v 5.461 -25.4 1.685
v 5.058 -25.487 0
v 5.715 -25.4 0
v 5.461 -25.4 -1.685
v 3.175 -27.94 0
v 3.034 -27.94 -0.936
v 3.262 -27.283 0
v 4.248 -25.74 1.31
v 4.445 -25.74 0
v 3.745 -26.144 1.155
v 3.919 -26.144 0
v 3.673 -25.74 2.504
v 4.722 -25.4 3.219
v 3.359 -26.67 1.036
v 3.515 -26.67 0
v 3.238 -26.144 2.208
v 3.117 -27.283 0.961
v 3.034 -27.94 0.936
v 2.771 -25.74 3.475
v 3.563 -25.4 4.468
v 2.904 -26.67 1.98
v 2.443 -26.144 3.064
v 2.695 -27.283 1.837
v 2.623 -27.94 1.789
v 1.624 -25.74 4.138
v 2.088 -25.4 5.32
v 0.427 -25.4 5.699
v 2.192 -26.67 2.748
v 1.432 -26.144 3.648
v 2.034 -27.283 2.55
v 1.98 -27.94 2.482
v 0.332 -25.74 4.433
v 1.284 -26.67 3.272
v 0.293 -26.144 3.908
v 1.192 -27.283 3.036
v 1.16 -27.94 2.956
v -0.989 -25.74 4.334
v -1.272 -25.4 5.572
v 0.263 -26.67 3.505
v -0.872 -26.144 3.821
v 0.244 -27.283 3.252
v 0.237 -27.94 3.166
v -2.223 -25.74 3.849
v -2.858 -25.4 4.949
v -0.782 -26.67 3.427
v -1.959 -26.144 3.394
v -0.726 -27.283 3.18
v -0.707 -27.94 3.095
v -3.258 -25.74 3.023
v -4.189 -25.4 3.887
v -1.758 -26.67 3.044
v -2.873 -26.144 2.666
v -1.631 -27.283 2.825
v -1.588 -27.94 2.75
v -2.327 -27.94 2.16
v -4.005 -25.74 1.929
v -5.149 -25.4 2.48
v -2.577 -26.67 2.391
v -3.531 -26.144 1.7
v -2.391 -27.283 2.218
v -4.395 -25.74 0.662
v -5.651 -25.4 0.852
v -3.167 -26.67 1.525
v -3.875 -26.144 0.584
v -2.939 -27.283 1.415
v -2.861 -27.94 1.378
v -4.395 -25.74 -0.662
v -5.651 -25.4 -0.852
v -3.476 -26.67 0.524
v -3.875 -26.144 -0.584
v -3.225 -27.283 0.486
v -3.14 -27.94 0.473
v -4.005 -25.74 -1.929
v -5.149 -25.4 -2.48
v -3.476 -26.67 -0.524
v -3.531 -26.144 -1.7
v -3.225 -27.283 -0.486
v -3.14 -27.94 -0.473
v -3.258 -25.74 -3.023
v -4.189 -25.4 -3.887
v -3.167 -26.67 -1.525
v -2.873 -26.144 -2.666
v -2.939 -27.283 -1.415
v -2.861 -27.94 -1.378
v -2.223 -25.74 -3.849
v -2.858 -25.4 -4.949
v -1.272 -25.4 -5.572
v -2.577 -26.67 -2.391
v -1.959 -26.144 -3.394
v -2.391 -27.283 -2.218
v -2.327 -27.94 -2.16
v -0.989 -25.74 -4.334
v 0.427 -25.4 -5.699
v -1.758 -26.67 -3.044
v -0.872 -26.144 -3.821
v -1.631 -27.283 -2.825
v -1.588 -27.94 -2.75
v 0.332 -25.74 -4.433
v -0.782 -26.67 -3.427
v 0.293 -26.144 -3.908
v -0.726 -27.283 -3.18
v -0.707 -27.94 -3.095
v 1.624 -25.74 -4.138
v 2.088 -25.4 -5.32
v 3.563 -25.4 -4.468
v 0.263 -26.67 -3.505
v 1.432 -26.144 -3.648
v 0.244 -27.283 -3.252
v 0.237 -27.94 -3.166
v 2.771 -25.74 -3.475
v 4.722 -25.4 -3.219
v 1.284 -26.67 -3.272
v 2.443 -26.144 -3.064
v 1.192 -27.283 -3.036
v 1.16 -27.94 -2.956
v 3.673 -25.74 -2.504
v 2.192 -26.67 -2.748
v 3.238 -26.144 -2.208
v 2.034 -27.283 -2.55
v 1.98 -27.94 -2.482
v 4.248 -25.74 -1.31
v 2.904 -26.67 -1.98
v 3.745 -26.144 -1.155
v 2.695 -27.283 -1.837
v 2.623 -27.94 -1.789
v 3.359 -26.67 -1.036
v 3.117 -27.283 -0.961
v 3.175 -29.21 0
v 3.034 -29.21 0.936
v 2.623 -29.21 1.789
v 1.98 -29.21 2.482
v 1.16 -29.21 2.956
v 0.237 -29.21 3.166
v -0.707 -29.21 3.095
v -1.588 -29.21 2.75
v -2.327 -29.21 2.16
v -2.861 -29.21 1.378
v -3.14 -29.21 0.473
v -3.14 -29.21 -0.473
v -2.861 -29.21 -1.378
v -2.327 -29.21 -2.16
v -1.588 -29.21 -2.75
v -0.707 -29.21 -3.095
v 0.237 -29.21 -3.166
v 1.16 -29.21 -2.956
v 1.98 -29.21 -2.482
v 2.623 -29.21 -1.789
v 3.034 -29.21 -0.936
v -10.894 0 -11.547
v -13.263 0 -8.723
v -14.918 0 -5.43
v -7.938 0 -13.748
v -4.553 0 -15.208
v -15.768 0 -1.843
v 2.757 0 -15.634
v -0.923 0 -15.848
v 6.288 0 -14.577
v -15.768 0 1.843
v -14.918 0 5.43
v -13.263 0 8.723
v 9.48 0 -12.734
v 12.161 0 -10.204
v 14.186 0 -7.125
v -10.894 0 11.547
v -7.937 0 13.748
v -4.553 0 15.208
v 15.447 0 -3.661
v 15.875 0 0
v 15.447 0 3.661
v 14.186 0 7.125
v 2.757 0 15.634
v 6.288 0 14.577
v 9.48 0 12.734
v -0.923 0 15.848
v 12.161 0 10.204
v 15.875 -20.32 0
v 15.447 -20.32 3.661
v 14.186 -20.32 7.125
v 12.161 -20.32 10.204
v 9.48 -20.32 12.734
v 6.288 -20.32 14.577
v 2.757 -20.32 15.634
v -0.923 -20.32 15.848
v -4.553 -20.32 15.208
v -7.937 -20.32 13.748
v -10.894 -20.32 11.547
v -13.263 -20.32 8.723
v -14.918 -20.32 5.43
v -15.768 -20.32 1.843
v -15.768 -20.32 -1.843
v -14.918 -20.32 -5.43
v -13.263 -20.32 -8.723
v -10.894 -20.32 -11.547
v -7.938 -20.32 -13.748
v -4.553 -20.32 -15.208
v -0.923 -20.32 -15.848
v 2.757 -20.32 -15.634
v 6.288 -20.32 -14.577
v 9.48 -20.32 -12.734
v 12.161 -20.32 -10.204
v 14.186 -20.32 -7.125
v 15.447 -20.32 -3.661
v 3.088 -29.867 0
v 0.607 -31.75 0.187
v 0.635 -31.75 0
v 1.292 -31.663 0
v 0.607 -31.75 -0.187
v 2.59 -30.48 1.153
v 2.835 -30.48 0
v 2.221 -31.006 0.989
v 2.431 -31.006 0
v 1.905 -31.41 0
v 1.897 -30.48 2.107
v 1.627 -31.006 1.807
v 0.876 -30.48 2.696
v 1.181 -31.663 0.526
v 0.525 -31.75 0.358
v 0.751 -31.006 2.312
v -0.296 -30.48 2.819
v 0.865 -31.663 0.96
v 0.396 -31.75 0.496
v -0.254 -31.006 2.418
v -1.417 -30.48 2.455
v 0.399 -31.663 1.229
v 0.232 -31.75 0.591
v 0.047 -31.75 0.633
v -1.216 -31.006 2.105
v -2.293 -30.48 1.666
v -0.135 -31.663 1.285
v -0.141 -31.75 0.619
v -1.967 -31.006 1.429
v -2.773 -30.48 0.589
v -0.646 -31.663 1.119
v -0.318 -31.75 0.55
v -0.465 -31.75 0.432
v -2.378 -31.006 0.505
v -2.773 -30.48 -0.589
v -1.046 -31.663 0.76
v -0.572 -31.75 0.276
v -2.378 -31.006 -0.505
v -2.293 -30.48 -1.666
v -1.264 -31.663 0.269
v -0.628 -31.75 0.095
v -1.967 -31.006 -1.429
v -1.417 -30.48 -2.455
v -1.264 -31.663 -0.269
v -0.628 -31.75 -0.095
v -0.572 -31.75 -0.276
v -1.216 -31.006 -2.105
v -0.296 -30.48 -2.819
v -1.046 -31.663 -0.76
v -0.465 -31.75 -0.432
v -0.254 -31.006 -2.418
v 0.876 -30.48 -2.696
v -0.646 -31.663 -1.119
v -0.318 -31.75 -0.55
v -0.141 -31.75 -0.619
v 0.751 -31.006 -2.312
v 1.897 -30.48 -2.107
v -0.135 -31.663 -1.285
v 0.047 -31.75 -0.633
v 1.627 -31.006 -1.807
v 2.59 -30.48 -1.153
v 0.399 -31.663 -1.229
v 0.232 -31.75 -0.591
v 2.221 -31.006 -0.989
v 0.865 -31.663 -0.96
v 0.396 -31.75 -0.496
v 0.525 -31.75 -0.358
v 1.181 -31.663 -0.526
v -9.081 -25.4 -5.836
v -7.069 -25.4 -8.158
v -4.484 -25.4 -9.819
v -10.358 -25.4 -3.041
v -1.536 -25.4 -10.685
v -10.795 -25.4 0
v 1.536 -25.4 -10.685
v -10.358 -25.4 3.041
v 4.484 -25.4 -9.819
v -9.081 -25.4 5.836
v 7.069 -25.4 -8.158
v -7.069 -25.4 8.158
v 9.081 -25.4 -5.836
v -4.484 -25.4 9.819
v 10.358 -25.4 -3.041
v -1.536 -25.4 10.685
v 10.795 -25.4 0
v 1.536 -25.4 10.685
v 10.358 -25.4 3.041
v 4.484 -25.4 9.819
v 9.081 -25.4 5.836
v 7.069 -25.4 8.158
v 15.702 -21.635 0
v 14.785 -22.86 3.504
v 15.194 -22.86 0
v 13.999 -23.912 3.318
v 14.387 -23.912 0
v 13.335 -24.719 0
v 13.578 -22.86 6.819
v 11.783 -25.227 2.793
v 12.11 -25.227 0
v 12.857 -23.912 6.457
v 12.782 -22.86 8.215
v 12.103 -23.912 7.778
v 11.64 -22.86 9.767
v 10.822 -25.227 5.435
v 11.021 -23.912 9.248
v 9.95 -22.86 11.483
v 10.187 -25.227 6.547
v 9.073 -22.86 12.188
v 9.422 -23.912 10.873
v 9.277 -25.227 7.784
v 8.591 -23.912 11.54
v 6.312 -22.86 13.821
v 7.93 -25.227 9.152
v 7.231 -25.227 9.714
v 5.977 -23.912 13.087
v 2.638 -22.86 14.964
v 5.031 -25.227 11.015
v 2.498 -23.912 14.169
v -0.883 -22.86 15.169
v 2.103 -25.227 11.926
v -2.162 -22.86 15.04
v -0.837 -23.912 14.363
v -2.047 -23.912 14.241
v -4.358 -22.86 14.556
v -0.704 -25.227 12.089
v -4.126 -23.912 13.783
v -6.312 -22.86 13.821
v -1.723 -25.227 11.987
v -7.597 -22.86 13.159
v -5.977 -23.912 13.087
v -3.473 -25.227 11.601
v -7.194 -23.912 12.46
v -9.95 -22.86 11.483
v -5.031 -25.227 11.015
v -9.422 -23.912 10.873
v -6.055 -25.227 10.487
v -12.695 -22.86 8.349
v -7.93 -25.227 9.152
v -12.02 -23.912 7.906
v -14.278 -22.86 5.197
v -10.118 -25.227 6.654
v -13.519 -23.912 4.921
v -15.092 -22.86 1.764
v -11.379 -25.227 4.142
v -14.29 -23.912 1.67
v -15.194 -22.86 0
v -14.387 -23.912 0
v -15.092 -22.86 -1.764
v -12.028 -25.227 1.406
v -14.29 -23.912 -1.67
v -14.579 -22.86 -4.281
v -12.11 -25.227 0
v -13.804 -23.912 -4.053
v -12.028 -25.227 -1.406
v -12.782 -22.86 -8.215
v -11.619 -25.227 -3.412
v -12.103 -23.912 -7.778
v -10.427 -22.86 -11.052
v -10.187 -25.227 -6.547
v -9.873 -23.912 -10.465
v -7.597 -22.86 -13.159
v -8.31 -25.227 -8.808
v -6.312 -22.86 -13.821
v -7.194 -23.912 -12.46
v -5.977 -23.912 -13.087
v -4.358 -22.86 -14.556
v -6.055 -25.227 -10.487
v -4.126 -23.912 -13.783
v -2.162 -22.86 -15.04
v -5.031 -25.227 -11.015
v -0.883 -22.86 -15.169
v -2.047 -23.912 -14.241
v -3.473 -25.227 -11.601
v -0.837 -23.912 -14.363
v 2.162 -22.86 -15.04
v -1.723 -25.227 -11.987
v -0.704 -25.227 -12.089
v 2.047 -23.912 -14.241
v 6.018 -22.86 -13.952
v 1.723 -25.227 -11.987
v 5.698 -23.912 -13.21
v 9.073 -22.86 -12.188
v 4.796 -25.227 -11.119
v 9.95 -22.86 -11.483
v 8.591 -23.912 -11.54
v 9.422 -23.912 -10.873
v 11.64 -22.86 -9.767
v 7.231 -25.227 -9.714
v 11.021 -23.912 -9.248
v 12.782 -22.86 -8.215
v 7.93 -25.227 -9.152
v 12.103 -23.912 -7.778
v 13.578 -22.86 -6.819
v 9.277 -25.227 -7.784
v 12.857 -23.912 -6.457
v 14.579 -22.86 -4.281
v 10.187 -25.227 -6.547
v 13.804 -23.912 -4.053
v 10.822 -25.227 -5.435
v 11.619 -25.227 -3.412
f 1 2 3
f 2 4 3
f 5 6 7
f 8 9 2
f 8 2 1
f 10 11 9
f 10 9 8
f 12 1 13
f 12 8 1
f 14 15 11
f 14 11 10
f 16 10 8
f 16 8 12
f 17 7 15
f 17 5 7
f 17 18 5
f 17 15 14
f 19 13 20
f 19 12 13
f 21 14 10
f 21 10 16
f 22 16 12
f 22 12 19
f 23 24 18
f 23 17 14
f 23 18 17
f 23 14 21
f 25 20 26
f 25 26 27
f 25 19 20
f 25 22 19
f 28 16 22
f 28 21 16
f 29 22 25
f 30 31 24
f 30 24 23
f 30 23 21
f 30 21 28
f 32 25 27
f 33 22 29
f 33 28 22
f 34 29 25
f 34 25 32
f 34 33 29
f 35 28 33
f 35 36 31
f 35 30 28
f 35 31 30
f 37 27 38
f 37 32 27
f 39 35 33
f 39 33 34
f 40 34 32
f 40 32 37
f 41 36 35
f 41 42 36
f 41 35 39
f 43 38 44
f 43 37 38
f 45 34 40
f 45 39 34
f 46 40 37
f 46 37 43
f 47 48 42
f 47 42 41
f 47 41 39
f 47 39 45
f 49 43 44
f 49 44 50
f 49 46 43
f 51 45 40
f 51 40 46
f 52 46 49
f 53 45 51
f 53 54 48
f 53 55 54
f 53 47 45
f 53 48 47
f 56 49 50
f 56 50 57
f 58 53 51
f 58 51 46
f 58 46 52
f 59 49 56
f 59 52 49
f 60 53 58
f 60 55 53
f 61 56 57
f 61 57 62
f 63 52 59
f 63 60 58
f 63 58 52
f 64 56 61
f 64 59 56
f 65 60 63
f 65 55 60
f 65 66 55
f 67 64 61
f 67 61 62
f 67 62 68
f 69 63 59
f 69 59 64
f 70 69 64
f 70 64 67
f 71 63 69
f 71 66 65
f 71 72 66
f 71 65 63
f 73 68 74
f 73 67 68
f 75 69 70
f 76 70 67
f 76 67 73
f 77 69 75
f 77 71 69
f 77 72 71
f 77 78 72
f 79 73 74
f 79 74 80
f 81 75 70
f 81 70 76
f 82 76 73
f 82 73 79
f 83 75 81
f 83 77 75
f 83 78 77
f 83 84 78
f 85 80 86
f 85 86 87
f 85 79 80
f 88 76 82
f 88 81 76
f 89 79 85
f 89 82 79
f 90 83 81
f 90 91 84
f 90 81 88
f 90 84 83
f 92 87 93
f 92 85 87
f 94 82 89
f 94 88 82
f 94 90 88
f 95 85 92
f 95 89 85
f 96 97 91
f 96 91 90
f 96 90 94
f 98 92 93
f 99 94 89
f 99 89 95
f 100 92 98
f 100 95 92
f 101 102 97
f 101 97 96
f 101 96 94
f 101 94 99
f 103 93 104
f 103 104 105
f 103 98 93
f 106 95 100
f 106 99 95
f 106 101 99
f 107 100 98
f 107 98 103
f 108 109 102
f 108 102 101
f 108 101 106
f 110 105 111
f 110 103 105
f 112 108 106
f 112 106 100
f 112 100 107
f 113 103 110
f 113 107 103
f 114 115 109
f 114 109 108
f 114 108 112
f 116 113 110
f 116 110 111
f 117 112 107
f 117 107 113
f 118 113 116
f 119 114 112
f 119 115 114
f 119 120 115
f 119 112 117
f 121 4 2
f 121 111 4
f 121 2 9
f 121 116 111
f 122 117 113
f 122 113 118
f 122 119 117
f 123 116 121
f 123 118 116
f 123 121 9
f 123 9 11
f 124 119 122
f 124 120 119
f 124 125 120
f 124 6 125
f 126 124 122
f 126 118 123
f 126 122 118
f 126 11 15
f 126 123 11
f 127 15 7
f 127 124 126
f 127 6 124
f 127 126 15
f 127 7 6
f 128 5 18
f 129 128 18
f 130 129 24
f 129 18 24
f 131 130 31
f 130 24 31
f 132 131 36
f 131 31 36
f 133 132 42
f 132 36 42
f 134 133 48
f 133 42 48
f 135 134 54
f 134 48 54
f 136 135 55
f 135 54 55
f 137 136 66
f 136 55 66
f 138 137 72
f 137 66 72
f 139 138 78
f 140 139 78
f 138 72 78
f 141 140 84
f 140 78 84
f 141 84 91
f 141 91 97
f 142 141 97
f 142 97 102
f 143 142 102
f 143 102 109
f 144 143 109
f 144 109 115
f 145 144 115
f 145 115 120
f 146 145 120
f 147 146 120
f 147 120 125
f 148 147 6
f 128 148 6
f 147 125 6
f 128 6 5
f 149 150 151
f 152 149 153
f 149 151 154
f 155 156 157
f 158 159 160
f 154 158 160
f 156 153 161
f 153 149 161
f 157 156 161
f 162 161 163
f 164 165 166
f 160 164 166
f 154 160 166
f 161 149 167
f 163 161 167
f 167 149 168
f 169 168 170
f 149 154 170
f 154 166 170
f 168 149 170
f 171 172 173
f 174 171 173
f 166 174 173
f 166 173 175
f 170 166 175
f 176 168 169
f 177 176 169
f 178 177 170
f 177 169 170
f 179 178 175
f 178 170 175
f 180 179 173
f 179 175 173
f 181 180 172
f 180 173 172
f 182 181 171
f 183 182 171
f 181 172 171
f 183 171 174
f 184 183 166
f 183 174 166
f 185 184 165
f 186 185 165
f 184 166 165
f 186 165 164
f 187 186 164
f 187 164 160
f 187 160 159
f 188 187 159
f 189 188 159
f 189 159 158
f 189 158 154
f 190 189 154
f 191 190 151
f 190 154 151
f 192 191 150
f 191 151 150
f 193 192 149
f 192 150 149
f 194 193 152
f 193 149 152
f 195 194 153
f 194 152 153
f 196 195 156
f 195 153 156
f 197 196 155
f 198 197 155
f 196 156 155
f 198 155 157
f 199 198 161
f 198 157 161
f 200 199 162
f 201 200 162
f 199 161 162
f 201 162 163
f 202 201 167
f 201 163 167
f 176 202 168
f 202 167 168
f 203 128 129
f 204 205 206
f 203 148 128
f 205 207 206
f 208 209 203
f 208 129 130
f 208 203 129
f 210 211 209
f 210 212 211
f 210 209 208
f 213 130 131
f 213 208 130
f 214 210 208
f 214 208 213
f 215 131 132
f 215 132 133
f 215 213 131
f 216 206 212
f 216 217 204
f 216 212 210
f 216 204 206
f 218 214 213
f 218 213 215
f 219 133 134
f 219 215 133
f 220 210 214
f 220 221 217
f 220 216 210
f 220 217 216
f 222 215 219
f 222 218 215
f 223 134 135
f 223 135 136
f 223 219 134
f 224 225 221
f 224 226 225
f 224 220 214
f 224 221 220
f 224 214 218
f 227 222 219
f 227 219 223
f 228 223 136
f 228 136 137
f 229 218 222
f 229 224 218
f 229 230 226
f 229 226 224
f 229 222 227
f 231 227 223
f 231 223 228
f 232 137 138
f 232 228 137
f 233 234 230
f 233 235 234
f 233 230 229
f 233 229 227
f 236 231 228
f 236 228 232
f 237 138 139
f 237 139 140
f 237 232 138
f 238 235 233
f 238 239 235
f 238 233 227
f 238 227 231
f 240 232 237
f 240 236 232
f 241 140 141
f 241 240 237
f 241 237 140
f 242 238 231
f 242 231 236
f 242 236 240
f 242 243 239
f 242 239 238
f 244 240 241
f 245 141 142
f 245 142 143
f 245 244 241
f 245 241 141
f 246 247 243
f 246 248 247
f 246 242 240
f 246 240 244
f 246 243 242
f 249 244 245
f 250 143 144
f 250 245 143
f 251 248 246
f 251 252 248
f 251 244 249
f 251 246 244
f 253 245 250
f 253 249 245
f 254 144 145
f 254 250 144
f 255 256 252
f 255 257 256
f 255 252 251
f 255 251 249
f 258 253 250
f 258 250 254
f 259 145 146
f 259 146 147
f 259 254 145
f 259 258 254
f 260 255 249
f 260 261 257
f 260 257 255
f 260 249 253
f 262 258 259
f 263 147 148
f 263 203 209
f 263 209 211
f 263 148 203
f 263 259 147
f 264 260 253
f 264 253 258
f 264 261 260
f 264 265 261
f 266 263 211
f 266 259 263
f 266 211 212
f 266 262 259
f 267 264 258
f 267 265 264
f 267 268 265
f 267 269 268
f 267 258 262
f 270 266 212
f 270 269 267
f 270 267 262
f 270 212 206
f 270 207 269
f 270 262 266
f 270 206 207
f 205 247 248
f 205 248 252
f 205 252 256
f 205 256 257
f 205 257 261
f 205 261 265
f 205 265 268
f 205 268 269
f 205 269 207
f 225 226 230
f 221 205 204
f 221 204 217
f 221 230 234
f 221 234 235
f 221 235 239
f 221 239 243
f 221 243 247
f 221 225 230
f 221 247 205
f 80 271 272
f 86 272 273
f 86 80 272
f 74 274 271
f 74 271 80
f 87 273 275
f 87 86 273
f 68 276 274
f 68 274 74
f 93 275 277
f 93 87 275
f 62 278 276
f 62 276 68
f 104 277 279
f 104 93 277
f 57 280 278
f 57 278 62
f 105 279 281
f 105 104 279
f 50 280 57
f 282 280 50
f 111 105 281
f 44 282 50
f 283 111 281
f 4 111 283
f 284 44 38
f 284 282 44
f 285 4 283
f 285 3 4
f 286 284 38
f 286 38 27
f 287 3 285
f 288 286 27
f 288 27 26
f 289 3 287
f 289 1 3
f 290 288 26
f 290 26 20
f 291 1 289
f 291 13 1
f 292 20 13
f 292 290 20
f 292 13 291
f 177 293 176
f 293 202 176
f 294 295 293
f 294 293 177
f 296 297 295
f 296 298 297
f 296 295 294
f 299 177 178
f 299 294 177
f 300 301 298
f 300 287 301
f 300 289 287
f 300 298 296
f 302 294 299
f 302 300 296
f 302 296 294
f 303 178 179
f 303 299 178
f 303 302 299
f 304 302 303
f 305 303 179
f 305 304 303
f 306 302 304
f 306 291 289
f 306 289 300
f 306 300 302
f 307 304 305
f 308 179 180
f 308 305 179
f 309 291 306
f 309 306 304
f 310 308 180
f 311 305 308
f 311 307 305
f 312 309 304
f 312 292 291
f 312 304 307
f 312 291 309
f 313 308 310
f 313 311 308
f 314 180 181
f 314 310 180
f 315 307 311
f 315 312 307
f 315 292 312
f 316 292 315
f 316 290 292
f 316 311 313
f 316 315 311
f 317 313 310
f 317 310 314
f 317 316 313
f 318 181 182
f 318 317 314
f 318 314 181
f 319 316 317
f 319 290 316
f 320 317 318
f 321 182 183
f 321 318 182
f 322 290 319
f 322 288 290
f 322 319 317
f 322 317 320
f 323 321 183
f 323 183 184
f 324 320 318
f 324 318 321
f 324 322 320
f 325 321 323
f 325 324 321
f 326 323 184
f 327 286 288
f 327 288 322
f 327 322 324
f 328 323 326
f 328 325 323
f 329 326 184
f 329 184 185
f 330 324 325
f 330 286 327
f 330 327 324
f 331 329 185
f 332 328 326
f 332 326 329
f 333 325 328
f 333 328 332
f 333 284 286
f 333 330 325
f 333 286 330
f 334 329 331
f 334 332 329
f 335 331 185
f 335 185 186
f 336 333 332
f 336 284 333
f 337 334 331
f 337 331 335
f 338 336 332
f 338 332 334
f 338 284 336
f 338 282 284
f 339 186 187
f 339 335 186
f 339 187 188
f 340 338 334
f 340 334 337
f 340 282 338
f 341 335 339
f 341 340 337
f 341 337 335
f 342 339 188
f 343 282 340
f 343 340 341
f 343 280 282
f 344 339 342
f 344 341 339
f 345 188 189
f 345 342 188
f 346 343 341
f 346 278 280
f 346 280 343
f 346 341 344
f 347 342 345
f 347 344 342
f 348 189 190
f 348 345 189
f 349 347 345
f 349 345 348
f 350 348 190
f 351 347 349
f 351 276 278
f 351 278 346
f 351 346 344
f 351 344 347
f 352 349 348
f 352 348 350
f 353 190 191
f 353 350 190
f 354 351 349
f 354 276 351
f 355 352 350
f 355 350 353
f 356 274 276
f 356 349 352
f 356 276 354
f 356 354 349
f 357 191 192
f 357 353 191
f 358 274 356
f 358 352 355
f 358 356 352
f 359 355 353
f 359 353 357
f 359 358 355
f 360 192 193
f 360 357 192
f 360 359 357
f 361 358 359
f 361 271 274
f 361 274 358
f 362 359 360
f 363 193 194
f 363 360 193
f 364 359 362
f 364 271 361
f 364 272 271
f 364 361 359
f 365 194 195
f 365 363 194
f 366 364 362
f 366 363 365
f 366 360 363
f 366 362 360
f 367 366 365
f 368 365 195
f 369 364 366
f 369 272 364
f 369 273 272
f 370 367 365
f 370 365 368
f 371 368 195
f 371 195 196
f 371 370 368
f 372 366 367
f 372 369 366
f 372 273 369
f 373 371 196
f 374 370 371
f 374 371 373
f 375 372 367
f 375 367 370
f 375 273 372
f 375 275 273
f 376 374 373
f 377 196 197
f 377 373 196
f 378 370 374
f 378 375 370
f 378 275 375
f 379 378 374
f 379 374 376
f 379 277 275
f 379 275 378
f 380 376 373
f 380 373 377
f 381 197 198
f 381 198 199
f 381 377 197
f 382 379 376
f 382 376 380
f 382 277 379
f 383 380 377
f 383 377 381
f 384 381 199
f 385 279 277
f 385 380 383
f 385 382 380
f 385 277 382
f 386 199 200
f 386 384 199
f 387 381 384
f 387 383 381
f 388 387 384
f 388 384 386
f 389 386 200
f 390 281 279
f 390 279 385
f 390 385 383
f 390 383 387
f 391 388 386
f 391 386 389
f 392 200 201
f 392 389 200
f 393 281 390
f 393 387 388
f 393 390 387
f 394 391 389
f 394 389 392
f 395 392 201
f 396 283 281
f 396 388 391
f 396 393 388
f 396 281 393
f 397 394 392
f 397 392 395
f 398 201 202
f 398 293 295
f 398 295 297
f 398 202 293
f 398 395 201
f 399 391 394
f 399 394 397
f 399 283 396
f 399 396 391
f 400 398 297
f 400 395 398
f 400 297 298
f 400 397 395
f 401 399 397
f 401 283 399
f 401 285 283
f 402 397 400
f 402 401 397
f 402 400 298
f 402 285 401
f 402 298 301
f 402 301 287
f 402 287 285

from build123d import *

# Parameters (mm, degrees)
F0_R     = 15.875
F1_DEPTH = 25.4
F2_R     = 5.08
F3_R     = 3.175
F4_DEPTH = 6.35
F5_R     = 2.54


with BuildPart() as f1:
    # F0 (on Front) → F1 (new body)
    with BuildSketch(Plane.XZ):
        Circle(F0_R)
    extrude(amount=F1_DEPTH)

    # F2
    f2_edges = [f1.edges().sort_by_distance(p)[0] for p in [
        (-15.875, -25.4, 0),
    ]]
    fillet(f2_edges, radius=F2_R)

    # F3 (on face) → F4 (join)
    with BuildSketch(Plane.XZ.offset(25.4)):
        Circle(F3_R)
    extrude(amount=F4_DEPTH)

    # F5
    f5_edges = [f1.edges().sort_by_distance(p)[0] for p in [
        (-3.175, -31.75, 0),
        (-3.175, -25.4, 0),
    ]]
    fillet(f5_edges, radius=F5_R)


solid = f1.part
